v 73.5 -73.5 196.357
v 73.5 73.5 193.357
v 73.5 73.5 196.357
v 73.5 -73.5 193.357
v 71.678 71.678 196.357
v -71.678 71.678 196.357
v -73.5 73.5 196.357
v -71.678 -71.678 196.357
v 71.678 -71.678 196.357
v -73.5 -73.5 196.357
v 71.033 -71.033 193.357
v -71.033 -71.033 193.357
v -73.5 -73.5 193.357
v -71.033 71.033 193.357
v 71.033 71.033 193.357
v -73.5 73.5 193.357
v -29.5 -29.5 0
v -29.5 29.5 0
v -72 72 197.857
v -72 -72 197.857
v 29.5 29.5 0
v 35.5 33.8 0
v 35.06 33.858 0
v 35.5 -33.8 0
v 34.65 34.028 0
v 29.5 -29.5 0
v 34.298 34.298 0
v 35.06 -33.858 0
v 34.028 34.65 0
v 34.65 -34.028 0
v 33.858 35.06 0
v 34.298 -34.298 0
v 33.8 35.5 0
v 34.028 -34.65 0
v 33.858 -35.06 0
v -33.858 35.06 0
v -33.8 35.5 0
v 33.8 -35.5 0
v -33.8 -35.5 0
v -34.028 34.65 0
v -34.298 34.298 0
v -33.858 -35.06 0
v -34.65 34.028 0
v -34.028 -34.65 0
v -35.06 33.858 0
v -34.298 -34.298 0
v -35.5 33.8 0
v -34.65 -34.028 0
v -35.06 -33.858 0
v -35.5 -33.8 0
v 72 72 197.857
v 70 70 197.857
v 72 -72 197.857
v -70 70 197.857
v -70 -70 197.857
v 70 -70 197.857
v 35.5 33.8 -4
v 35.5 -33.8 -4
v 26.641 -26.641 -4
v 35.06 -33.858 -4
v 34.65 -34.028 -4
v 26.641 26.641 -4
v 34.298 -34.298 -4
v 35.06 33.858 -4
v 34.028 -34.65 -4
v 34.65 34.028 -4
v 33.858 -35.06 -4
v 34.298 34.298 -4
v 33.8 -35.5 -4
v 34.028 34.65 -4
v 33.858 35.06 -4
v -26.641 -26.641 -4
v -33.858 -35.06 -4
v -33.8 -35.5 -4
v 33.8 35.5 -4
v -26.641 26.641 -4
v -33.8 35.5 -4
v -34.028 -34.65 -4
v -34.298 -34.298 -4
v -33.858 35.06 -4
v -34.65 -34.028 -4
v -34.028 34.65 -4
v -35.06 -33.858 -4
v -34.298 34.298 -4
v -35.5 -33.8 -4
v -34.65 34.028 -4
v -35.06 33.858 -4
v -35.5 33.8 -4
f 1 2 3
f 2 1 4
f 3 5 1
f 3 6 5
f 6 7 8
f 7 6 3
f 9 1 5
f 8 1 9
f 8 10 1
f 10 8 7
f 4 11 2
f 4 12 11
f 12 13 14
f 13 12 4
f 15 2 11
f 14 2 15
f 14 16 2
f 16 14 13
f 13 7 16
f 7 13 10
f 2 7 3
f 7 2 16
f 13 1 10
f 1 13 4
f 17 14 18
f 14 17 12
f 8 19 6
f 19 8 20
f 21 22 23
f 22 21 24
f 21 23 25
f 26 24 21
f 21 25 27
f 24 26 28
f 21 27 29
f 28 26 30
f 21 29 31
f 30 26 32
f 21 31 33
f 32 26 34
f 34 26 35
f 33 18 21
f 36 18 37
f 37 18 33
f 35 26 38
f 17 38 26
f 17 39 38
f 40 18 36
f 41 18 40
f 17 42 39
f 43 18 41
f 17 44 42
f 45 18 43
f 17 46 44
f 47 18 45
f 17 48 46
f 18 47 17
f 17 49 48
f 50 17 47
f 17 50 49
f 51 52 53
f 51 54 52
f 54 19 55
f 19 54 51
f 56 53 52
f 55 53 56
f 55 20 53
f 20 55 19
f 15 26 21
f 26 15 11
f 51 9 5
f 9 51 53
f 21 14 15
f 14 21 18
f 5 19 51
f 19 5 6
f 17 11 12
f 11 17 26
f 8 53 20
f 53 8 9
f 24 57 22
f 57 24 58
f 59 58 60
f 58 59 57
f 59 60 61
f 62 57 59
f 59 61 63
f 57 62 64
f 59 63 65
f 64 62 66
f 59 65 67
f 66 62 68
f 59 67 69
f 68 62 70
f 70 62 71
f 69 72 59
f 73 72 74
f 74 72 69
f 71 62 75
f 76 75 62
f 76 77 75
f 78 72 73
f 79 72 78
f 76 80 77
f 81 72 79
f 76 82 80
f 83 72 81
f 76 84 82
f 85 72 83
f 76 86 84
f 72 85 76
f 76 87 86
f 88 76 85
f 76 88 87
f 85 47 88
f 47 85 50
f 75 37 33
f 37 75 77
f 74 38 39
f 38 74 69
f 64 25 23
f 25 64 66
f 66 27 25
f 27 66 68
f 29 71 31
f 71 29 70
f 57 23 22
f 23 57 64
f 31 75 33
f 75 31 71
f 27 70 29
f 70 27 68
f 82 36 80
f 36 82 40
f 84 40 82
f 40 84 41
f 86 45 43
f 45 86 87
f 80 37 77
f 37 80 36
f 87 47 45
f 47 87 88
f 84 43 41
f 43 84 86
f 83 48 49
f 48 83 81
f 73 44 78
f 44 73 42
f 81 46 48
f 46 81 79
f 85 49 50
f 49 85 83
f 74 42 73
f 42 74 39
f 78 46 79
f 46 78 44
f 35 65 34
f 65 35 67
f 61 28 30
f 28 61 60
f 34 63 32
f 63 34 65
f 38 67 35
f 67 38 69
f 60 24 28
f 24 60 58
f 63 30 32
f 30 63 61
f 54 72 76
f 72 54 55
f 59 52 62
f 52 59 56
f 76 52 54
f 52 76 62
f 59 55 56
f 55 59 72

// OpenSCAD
// file: common.scad
// common.scad — every dimension in the feeder lives here.
// Change a value, re-run ../check.sh, and every part regrows together.

/* ---------- Printer envelope ---------- */
bed_x = 220;
bed_y = 220;
bed_z = 250;

/* ---------- Material and process ---------- */
wall      = 2.0;    // nominal wall thickness (5 perimeters at 0.4 nozzle)
fit_slide = 0.30;   // clearance for parts that must move against each other
fit_press = 0.15;   // clearance for parts pressed together
$fn       = 96;

/* ---------- Fasteners ---------- */
m3_free = 3.4;      // M3 clearance hole
m3_tap  = 2.8;      // M3 self-tapping into plastic
m4_free = 4.5;

/* ---------- Load cells (VERIFY against the cells you actually buy) ----------
   Figures below are for the common YZC-133 straight bar. Bolt spacing varies
   between suppliers; measure yours before printing the base or the platform. */
cell_l            = 80;
cell_w            = 12.7;
cell_h            = 12.7;
cell_bolt_spacing = 15;   // centre-to-centre, at each end
cell_gap          = 3;    // spacer thickness — the beam MUST be free to flex

/* ---------- Food model ---------- */
kibble_density = 0.40;   // g/cm^3, dry kibble bulk density

/* ---------- Hopper ---------- */
hopper_volume_l = 2.0;
hopper_mouth    = 140;   // inner, square, at the top
hopper_throat   = 55;    // inner, square, at the bottom

// Square frustum volume: V = h/3 * (A1 + A2 + sqrt(A1*A2))
// For squares sqrt(A1*A2) collapses to mouth*throat, so height is exact:
hopper_h = 3 * hopper_volume_l * 1000000 /
           (hopper_mouth*hopper_mouth + hopper_throat*hopper_throat +
            hopper_mouth*hopper_throat);

hopper_run        = (hopper_mouth - hopper_throat) / 2;
hopper_wall_angle = atan(hopper_h / hopper_run);   // from horizontal
hopper_taper_rate = (hopper_mouth - hopper_throat) / hopper_h;
hopper_capacity_g = hopper_volume_l * 1000 * kibble_density;

/* ---------- Drum valve ---------- */
drum_dia       = 50;
drum_len       = 60;
drum_clearance = 0.4;                      // radial
drum_bore      = drum_dia + 2*drum_clearance;
pocket_depth   = 11.3;                     // segment depth of the scoop
shaft_dia      = 6;
shaft_len      = 8;

// Circular-segment maths. OpenSCAD trig is in DEGREES; the segment area
// formula needs the angle in RADIANS, hence the two forms below.
drum_r          = drum_dia / 2;
pocket_theta    = 2 * acos(1 - pocket_depth/drum_r);        // degrees
pocket_theta_r  = pocket_theta * PI / 180;                  // radians
pocket_area     = drum_r*drum_r/2 * (pocket_theta_r - sin(pocket_theta));
pocket_volume   = pocket_area * drum_len;                   // mm^3
sweep_grams     = pocket_volume / 1000 * kibble_density;    // DERIVED, not assumed

/* ---------- Valve housing ---------- */
housing_x = drum_len + 4*wall;      // along the drum axis
housing_y = drum_bore + 4*wall;
housing_z = drum_bore + 4*wall;
outlet_x  = 45;
outlet_y  = 45;

/* ---------- Chute ---------- */
chute_forward = 70;    // how far forward of the tower the food lands
chute_drop    = 90;    // vertical fall from valve outlet to chute exit
chute_exit    = 40;
chute_clear   = 40;    // exit height above the bowl rim — impulse, not load

/* ---------- Bowl and platform ---------- */
bowl_dia     = 140;    // the BOUGHT stainless/ceramic bowl
platform_dia = 150;
platform_t   = 5;
ring_w       = 3;
ring_h       = 8;
bowl_gap     = 6;      // air on every side — the isolation gap

/* ---------- Base and tower ---------- */
base_size = 190;
base_t    = 6;
bay_h     = 28;        // electronics bay height
tower_w   = 90;
tower_d   = 70;
tower_h   = 150;

/* ---------- Head ---------- */
head_tilt   = 30;      // camera, degrees down from horizontal
cam_pcb     = [40, 40, 1.6];
sr04_dia    = 16;
sr04_pitch  = 26;      // centre-to-centre of the two transducers

/* ---------- Derived overall ---------- */
total_h = base_t + bay_h + tower_h + housing_z + hopper_h;

/* ---------- Assertions: the things that silently ruin a print ---------- */
assert(hopper_wall_angle >= 60,
       str("Hopper wall ", hopper_wall_angle, " deg is below 60 - kibble will bridge"));
assert(hopper_h + 2*wall <= bed_z,
       str("Hopper ", hopper_h, " mm exceeds bed Z ", bed_z));
assert(hopper_mouth + 2*wall <= bed_x,
       "Hopper mouth exceeds bed X");
assert(base_size <= bed_x && base_size <= bed_y,
       "Base exceeds bed footprint");
assert(platform_dia <= bed_x, "Bowl platform exceeds bed X");
assert(drum_clearance > 0, "Drum clearance must be positive or the drum seizes");
assert(drum_bore > drum_dia, "Drum bore must exceed drum diameter");
assert(pocket_depth < drum_r,
       "Pocket deeper than the drum radius - the scoop would cut through the axis");
assert(sweep_grams > 6 && sweep_grams < 10,
       str("Sweep delivers ", sweep_grams, " g - outside the 6-10 g design window"));
assert(bowl_gap > 0, "Bowl isolation gap must be positive");
assert(cell_gap > 0, "Load cell needs a flex gap or it reads nothing");
assert(chute_forward + 40 <= bed_y,
       "Bowl arm exceeds bed Y - split it or shorten chute_forward");

/* ---------- Shared geometry ---------- */
// A square frustum, bottom face on the XY plane, centred on Z.
module frustum(bottom, top, h) {
  linear_extrude(height = h, scale = top/bottom)
    square([bottom, bottom], center = true);
}

// A rectangular tube used for the labyrinth lip on the lid and hopper mouth.
module lip(inner, thickness, h) {
  difference() {
    cube([inner + 2*thickness, inner + 2*thickness, h], center = true);
    cube([inner, inner, h + 1], center = true);
  }
}

// Four bolt holes on a square pattern.
module bolt_square(spacing, dia, h) {
  for (i = [0:3])
    rotate([0, 0, 90*i])
      translate([spacing/2, spacing/2, 0])
        cylinder(d = dia, h = h, center = true, $fn = 24);
}

// The cantilever footprint a load cell bolts into: two holes plus a relief slot.
module cell_mount(dia = m3_tap, h = 10) {
  for (y = [-cell_bolt_spacing/2, cell_bolt_spacing/2])
    translate([0, y, 0]) cylinder(d = dia, h = h, center = true, $fn = 24);
}

echo(str("hopper_h = ", hopper_h, " mm"));
echo(str("hopper wall angle = ", hopper_wall_angle, " deg"));
echo(str("hopper capacity = ", hopper_capacity_g, " g"));
echo(str("sweep = ", sweep_grams, " g"));
echo(str("total height = ", total_h, " mm"));
// main file
include <common.scad>

flange_w = 6;
flange_t = 4;
flange_bolts = hopper_throat + 2*wall + 12;

module hopper() {
  difference() {
    union() {
      // Outer shell.
      frustum(hopper_throat + 2*wall, hopper_mouth + 2*wall, hopper_h);
      // Throat flange — bolts onto the valve housing.
      translate([0, 0, -flange_t/2])
        cube([hopper_throat + 2*wall + 2*flange_w,
              hopper_throat + 2*wall + 2*flange_w, flange_t], center = true);
      // Mouth rim, thickened so the lid lip has something to seat against.
      translate([0, 0, hopper_h - 3])
        lip(hopper_mouth, wall + 1.5, 3);
    }

    // Food void. Extended past each end so the boolean has no coincident
    // faces; the taper rate is applied so the throat and mouth stay exact.
    translate([0, 0, -flange_t - 1])
      frustum(hopper_throat - hopper_taper_rate * (flange_t + 1),
              hopper_mouth  + hopper_taper_rate,
              hopper_h + flange_t + 2);

    // Flange bolt holes.
    translate([0, 0, -flange_t/2])
      bolt_square(flange_bolts, m3_free, flange_t + 2);
  }
}

hopper();
